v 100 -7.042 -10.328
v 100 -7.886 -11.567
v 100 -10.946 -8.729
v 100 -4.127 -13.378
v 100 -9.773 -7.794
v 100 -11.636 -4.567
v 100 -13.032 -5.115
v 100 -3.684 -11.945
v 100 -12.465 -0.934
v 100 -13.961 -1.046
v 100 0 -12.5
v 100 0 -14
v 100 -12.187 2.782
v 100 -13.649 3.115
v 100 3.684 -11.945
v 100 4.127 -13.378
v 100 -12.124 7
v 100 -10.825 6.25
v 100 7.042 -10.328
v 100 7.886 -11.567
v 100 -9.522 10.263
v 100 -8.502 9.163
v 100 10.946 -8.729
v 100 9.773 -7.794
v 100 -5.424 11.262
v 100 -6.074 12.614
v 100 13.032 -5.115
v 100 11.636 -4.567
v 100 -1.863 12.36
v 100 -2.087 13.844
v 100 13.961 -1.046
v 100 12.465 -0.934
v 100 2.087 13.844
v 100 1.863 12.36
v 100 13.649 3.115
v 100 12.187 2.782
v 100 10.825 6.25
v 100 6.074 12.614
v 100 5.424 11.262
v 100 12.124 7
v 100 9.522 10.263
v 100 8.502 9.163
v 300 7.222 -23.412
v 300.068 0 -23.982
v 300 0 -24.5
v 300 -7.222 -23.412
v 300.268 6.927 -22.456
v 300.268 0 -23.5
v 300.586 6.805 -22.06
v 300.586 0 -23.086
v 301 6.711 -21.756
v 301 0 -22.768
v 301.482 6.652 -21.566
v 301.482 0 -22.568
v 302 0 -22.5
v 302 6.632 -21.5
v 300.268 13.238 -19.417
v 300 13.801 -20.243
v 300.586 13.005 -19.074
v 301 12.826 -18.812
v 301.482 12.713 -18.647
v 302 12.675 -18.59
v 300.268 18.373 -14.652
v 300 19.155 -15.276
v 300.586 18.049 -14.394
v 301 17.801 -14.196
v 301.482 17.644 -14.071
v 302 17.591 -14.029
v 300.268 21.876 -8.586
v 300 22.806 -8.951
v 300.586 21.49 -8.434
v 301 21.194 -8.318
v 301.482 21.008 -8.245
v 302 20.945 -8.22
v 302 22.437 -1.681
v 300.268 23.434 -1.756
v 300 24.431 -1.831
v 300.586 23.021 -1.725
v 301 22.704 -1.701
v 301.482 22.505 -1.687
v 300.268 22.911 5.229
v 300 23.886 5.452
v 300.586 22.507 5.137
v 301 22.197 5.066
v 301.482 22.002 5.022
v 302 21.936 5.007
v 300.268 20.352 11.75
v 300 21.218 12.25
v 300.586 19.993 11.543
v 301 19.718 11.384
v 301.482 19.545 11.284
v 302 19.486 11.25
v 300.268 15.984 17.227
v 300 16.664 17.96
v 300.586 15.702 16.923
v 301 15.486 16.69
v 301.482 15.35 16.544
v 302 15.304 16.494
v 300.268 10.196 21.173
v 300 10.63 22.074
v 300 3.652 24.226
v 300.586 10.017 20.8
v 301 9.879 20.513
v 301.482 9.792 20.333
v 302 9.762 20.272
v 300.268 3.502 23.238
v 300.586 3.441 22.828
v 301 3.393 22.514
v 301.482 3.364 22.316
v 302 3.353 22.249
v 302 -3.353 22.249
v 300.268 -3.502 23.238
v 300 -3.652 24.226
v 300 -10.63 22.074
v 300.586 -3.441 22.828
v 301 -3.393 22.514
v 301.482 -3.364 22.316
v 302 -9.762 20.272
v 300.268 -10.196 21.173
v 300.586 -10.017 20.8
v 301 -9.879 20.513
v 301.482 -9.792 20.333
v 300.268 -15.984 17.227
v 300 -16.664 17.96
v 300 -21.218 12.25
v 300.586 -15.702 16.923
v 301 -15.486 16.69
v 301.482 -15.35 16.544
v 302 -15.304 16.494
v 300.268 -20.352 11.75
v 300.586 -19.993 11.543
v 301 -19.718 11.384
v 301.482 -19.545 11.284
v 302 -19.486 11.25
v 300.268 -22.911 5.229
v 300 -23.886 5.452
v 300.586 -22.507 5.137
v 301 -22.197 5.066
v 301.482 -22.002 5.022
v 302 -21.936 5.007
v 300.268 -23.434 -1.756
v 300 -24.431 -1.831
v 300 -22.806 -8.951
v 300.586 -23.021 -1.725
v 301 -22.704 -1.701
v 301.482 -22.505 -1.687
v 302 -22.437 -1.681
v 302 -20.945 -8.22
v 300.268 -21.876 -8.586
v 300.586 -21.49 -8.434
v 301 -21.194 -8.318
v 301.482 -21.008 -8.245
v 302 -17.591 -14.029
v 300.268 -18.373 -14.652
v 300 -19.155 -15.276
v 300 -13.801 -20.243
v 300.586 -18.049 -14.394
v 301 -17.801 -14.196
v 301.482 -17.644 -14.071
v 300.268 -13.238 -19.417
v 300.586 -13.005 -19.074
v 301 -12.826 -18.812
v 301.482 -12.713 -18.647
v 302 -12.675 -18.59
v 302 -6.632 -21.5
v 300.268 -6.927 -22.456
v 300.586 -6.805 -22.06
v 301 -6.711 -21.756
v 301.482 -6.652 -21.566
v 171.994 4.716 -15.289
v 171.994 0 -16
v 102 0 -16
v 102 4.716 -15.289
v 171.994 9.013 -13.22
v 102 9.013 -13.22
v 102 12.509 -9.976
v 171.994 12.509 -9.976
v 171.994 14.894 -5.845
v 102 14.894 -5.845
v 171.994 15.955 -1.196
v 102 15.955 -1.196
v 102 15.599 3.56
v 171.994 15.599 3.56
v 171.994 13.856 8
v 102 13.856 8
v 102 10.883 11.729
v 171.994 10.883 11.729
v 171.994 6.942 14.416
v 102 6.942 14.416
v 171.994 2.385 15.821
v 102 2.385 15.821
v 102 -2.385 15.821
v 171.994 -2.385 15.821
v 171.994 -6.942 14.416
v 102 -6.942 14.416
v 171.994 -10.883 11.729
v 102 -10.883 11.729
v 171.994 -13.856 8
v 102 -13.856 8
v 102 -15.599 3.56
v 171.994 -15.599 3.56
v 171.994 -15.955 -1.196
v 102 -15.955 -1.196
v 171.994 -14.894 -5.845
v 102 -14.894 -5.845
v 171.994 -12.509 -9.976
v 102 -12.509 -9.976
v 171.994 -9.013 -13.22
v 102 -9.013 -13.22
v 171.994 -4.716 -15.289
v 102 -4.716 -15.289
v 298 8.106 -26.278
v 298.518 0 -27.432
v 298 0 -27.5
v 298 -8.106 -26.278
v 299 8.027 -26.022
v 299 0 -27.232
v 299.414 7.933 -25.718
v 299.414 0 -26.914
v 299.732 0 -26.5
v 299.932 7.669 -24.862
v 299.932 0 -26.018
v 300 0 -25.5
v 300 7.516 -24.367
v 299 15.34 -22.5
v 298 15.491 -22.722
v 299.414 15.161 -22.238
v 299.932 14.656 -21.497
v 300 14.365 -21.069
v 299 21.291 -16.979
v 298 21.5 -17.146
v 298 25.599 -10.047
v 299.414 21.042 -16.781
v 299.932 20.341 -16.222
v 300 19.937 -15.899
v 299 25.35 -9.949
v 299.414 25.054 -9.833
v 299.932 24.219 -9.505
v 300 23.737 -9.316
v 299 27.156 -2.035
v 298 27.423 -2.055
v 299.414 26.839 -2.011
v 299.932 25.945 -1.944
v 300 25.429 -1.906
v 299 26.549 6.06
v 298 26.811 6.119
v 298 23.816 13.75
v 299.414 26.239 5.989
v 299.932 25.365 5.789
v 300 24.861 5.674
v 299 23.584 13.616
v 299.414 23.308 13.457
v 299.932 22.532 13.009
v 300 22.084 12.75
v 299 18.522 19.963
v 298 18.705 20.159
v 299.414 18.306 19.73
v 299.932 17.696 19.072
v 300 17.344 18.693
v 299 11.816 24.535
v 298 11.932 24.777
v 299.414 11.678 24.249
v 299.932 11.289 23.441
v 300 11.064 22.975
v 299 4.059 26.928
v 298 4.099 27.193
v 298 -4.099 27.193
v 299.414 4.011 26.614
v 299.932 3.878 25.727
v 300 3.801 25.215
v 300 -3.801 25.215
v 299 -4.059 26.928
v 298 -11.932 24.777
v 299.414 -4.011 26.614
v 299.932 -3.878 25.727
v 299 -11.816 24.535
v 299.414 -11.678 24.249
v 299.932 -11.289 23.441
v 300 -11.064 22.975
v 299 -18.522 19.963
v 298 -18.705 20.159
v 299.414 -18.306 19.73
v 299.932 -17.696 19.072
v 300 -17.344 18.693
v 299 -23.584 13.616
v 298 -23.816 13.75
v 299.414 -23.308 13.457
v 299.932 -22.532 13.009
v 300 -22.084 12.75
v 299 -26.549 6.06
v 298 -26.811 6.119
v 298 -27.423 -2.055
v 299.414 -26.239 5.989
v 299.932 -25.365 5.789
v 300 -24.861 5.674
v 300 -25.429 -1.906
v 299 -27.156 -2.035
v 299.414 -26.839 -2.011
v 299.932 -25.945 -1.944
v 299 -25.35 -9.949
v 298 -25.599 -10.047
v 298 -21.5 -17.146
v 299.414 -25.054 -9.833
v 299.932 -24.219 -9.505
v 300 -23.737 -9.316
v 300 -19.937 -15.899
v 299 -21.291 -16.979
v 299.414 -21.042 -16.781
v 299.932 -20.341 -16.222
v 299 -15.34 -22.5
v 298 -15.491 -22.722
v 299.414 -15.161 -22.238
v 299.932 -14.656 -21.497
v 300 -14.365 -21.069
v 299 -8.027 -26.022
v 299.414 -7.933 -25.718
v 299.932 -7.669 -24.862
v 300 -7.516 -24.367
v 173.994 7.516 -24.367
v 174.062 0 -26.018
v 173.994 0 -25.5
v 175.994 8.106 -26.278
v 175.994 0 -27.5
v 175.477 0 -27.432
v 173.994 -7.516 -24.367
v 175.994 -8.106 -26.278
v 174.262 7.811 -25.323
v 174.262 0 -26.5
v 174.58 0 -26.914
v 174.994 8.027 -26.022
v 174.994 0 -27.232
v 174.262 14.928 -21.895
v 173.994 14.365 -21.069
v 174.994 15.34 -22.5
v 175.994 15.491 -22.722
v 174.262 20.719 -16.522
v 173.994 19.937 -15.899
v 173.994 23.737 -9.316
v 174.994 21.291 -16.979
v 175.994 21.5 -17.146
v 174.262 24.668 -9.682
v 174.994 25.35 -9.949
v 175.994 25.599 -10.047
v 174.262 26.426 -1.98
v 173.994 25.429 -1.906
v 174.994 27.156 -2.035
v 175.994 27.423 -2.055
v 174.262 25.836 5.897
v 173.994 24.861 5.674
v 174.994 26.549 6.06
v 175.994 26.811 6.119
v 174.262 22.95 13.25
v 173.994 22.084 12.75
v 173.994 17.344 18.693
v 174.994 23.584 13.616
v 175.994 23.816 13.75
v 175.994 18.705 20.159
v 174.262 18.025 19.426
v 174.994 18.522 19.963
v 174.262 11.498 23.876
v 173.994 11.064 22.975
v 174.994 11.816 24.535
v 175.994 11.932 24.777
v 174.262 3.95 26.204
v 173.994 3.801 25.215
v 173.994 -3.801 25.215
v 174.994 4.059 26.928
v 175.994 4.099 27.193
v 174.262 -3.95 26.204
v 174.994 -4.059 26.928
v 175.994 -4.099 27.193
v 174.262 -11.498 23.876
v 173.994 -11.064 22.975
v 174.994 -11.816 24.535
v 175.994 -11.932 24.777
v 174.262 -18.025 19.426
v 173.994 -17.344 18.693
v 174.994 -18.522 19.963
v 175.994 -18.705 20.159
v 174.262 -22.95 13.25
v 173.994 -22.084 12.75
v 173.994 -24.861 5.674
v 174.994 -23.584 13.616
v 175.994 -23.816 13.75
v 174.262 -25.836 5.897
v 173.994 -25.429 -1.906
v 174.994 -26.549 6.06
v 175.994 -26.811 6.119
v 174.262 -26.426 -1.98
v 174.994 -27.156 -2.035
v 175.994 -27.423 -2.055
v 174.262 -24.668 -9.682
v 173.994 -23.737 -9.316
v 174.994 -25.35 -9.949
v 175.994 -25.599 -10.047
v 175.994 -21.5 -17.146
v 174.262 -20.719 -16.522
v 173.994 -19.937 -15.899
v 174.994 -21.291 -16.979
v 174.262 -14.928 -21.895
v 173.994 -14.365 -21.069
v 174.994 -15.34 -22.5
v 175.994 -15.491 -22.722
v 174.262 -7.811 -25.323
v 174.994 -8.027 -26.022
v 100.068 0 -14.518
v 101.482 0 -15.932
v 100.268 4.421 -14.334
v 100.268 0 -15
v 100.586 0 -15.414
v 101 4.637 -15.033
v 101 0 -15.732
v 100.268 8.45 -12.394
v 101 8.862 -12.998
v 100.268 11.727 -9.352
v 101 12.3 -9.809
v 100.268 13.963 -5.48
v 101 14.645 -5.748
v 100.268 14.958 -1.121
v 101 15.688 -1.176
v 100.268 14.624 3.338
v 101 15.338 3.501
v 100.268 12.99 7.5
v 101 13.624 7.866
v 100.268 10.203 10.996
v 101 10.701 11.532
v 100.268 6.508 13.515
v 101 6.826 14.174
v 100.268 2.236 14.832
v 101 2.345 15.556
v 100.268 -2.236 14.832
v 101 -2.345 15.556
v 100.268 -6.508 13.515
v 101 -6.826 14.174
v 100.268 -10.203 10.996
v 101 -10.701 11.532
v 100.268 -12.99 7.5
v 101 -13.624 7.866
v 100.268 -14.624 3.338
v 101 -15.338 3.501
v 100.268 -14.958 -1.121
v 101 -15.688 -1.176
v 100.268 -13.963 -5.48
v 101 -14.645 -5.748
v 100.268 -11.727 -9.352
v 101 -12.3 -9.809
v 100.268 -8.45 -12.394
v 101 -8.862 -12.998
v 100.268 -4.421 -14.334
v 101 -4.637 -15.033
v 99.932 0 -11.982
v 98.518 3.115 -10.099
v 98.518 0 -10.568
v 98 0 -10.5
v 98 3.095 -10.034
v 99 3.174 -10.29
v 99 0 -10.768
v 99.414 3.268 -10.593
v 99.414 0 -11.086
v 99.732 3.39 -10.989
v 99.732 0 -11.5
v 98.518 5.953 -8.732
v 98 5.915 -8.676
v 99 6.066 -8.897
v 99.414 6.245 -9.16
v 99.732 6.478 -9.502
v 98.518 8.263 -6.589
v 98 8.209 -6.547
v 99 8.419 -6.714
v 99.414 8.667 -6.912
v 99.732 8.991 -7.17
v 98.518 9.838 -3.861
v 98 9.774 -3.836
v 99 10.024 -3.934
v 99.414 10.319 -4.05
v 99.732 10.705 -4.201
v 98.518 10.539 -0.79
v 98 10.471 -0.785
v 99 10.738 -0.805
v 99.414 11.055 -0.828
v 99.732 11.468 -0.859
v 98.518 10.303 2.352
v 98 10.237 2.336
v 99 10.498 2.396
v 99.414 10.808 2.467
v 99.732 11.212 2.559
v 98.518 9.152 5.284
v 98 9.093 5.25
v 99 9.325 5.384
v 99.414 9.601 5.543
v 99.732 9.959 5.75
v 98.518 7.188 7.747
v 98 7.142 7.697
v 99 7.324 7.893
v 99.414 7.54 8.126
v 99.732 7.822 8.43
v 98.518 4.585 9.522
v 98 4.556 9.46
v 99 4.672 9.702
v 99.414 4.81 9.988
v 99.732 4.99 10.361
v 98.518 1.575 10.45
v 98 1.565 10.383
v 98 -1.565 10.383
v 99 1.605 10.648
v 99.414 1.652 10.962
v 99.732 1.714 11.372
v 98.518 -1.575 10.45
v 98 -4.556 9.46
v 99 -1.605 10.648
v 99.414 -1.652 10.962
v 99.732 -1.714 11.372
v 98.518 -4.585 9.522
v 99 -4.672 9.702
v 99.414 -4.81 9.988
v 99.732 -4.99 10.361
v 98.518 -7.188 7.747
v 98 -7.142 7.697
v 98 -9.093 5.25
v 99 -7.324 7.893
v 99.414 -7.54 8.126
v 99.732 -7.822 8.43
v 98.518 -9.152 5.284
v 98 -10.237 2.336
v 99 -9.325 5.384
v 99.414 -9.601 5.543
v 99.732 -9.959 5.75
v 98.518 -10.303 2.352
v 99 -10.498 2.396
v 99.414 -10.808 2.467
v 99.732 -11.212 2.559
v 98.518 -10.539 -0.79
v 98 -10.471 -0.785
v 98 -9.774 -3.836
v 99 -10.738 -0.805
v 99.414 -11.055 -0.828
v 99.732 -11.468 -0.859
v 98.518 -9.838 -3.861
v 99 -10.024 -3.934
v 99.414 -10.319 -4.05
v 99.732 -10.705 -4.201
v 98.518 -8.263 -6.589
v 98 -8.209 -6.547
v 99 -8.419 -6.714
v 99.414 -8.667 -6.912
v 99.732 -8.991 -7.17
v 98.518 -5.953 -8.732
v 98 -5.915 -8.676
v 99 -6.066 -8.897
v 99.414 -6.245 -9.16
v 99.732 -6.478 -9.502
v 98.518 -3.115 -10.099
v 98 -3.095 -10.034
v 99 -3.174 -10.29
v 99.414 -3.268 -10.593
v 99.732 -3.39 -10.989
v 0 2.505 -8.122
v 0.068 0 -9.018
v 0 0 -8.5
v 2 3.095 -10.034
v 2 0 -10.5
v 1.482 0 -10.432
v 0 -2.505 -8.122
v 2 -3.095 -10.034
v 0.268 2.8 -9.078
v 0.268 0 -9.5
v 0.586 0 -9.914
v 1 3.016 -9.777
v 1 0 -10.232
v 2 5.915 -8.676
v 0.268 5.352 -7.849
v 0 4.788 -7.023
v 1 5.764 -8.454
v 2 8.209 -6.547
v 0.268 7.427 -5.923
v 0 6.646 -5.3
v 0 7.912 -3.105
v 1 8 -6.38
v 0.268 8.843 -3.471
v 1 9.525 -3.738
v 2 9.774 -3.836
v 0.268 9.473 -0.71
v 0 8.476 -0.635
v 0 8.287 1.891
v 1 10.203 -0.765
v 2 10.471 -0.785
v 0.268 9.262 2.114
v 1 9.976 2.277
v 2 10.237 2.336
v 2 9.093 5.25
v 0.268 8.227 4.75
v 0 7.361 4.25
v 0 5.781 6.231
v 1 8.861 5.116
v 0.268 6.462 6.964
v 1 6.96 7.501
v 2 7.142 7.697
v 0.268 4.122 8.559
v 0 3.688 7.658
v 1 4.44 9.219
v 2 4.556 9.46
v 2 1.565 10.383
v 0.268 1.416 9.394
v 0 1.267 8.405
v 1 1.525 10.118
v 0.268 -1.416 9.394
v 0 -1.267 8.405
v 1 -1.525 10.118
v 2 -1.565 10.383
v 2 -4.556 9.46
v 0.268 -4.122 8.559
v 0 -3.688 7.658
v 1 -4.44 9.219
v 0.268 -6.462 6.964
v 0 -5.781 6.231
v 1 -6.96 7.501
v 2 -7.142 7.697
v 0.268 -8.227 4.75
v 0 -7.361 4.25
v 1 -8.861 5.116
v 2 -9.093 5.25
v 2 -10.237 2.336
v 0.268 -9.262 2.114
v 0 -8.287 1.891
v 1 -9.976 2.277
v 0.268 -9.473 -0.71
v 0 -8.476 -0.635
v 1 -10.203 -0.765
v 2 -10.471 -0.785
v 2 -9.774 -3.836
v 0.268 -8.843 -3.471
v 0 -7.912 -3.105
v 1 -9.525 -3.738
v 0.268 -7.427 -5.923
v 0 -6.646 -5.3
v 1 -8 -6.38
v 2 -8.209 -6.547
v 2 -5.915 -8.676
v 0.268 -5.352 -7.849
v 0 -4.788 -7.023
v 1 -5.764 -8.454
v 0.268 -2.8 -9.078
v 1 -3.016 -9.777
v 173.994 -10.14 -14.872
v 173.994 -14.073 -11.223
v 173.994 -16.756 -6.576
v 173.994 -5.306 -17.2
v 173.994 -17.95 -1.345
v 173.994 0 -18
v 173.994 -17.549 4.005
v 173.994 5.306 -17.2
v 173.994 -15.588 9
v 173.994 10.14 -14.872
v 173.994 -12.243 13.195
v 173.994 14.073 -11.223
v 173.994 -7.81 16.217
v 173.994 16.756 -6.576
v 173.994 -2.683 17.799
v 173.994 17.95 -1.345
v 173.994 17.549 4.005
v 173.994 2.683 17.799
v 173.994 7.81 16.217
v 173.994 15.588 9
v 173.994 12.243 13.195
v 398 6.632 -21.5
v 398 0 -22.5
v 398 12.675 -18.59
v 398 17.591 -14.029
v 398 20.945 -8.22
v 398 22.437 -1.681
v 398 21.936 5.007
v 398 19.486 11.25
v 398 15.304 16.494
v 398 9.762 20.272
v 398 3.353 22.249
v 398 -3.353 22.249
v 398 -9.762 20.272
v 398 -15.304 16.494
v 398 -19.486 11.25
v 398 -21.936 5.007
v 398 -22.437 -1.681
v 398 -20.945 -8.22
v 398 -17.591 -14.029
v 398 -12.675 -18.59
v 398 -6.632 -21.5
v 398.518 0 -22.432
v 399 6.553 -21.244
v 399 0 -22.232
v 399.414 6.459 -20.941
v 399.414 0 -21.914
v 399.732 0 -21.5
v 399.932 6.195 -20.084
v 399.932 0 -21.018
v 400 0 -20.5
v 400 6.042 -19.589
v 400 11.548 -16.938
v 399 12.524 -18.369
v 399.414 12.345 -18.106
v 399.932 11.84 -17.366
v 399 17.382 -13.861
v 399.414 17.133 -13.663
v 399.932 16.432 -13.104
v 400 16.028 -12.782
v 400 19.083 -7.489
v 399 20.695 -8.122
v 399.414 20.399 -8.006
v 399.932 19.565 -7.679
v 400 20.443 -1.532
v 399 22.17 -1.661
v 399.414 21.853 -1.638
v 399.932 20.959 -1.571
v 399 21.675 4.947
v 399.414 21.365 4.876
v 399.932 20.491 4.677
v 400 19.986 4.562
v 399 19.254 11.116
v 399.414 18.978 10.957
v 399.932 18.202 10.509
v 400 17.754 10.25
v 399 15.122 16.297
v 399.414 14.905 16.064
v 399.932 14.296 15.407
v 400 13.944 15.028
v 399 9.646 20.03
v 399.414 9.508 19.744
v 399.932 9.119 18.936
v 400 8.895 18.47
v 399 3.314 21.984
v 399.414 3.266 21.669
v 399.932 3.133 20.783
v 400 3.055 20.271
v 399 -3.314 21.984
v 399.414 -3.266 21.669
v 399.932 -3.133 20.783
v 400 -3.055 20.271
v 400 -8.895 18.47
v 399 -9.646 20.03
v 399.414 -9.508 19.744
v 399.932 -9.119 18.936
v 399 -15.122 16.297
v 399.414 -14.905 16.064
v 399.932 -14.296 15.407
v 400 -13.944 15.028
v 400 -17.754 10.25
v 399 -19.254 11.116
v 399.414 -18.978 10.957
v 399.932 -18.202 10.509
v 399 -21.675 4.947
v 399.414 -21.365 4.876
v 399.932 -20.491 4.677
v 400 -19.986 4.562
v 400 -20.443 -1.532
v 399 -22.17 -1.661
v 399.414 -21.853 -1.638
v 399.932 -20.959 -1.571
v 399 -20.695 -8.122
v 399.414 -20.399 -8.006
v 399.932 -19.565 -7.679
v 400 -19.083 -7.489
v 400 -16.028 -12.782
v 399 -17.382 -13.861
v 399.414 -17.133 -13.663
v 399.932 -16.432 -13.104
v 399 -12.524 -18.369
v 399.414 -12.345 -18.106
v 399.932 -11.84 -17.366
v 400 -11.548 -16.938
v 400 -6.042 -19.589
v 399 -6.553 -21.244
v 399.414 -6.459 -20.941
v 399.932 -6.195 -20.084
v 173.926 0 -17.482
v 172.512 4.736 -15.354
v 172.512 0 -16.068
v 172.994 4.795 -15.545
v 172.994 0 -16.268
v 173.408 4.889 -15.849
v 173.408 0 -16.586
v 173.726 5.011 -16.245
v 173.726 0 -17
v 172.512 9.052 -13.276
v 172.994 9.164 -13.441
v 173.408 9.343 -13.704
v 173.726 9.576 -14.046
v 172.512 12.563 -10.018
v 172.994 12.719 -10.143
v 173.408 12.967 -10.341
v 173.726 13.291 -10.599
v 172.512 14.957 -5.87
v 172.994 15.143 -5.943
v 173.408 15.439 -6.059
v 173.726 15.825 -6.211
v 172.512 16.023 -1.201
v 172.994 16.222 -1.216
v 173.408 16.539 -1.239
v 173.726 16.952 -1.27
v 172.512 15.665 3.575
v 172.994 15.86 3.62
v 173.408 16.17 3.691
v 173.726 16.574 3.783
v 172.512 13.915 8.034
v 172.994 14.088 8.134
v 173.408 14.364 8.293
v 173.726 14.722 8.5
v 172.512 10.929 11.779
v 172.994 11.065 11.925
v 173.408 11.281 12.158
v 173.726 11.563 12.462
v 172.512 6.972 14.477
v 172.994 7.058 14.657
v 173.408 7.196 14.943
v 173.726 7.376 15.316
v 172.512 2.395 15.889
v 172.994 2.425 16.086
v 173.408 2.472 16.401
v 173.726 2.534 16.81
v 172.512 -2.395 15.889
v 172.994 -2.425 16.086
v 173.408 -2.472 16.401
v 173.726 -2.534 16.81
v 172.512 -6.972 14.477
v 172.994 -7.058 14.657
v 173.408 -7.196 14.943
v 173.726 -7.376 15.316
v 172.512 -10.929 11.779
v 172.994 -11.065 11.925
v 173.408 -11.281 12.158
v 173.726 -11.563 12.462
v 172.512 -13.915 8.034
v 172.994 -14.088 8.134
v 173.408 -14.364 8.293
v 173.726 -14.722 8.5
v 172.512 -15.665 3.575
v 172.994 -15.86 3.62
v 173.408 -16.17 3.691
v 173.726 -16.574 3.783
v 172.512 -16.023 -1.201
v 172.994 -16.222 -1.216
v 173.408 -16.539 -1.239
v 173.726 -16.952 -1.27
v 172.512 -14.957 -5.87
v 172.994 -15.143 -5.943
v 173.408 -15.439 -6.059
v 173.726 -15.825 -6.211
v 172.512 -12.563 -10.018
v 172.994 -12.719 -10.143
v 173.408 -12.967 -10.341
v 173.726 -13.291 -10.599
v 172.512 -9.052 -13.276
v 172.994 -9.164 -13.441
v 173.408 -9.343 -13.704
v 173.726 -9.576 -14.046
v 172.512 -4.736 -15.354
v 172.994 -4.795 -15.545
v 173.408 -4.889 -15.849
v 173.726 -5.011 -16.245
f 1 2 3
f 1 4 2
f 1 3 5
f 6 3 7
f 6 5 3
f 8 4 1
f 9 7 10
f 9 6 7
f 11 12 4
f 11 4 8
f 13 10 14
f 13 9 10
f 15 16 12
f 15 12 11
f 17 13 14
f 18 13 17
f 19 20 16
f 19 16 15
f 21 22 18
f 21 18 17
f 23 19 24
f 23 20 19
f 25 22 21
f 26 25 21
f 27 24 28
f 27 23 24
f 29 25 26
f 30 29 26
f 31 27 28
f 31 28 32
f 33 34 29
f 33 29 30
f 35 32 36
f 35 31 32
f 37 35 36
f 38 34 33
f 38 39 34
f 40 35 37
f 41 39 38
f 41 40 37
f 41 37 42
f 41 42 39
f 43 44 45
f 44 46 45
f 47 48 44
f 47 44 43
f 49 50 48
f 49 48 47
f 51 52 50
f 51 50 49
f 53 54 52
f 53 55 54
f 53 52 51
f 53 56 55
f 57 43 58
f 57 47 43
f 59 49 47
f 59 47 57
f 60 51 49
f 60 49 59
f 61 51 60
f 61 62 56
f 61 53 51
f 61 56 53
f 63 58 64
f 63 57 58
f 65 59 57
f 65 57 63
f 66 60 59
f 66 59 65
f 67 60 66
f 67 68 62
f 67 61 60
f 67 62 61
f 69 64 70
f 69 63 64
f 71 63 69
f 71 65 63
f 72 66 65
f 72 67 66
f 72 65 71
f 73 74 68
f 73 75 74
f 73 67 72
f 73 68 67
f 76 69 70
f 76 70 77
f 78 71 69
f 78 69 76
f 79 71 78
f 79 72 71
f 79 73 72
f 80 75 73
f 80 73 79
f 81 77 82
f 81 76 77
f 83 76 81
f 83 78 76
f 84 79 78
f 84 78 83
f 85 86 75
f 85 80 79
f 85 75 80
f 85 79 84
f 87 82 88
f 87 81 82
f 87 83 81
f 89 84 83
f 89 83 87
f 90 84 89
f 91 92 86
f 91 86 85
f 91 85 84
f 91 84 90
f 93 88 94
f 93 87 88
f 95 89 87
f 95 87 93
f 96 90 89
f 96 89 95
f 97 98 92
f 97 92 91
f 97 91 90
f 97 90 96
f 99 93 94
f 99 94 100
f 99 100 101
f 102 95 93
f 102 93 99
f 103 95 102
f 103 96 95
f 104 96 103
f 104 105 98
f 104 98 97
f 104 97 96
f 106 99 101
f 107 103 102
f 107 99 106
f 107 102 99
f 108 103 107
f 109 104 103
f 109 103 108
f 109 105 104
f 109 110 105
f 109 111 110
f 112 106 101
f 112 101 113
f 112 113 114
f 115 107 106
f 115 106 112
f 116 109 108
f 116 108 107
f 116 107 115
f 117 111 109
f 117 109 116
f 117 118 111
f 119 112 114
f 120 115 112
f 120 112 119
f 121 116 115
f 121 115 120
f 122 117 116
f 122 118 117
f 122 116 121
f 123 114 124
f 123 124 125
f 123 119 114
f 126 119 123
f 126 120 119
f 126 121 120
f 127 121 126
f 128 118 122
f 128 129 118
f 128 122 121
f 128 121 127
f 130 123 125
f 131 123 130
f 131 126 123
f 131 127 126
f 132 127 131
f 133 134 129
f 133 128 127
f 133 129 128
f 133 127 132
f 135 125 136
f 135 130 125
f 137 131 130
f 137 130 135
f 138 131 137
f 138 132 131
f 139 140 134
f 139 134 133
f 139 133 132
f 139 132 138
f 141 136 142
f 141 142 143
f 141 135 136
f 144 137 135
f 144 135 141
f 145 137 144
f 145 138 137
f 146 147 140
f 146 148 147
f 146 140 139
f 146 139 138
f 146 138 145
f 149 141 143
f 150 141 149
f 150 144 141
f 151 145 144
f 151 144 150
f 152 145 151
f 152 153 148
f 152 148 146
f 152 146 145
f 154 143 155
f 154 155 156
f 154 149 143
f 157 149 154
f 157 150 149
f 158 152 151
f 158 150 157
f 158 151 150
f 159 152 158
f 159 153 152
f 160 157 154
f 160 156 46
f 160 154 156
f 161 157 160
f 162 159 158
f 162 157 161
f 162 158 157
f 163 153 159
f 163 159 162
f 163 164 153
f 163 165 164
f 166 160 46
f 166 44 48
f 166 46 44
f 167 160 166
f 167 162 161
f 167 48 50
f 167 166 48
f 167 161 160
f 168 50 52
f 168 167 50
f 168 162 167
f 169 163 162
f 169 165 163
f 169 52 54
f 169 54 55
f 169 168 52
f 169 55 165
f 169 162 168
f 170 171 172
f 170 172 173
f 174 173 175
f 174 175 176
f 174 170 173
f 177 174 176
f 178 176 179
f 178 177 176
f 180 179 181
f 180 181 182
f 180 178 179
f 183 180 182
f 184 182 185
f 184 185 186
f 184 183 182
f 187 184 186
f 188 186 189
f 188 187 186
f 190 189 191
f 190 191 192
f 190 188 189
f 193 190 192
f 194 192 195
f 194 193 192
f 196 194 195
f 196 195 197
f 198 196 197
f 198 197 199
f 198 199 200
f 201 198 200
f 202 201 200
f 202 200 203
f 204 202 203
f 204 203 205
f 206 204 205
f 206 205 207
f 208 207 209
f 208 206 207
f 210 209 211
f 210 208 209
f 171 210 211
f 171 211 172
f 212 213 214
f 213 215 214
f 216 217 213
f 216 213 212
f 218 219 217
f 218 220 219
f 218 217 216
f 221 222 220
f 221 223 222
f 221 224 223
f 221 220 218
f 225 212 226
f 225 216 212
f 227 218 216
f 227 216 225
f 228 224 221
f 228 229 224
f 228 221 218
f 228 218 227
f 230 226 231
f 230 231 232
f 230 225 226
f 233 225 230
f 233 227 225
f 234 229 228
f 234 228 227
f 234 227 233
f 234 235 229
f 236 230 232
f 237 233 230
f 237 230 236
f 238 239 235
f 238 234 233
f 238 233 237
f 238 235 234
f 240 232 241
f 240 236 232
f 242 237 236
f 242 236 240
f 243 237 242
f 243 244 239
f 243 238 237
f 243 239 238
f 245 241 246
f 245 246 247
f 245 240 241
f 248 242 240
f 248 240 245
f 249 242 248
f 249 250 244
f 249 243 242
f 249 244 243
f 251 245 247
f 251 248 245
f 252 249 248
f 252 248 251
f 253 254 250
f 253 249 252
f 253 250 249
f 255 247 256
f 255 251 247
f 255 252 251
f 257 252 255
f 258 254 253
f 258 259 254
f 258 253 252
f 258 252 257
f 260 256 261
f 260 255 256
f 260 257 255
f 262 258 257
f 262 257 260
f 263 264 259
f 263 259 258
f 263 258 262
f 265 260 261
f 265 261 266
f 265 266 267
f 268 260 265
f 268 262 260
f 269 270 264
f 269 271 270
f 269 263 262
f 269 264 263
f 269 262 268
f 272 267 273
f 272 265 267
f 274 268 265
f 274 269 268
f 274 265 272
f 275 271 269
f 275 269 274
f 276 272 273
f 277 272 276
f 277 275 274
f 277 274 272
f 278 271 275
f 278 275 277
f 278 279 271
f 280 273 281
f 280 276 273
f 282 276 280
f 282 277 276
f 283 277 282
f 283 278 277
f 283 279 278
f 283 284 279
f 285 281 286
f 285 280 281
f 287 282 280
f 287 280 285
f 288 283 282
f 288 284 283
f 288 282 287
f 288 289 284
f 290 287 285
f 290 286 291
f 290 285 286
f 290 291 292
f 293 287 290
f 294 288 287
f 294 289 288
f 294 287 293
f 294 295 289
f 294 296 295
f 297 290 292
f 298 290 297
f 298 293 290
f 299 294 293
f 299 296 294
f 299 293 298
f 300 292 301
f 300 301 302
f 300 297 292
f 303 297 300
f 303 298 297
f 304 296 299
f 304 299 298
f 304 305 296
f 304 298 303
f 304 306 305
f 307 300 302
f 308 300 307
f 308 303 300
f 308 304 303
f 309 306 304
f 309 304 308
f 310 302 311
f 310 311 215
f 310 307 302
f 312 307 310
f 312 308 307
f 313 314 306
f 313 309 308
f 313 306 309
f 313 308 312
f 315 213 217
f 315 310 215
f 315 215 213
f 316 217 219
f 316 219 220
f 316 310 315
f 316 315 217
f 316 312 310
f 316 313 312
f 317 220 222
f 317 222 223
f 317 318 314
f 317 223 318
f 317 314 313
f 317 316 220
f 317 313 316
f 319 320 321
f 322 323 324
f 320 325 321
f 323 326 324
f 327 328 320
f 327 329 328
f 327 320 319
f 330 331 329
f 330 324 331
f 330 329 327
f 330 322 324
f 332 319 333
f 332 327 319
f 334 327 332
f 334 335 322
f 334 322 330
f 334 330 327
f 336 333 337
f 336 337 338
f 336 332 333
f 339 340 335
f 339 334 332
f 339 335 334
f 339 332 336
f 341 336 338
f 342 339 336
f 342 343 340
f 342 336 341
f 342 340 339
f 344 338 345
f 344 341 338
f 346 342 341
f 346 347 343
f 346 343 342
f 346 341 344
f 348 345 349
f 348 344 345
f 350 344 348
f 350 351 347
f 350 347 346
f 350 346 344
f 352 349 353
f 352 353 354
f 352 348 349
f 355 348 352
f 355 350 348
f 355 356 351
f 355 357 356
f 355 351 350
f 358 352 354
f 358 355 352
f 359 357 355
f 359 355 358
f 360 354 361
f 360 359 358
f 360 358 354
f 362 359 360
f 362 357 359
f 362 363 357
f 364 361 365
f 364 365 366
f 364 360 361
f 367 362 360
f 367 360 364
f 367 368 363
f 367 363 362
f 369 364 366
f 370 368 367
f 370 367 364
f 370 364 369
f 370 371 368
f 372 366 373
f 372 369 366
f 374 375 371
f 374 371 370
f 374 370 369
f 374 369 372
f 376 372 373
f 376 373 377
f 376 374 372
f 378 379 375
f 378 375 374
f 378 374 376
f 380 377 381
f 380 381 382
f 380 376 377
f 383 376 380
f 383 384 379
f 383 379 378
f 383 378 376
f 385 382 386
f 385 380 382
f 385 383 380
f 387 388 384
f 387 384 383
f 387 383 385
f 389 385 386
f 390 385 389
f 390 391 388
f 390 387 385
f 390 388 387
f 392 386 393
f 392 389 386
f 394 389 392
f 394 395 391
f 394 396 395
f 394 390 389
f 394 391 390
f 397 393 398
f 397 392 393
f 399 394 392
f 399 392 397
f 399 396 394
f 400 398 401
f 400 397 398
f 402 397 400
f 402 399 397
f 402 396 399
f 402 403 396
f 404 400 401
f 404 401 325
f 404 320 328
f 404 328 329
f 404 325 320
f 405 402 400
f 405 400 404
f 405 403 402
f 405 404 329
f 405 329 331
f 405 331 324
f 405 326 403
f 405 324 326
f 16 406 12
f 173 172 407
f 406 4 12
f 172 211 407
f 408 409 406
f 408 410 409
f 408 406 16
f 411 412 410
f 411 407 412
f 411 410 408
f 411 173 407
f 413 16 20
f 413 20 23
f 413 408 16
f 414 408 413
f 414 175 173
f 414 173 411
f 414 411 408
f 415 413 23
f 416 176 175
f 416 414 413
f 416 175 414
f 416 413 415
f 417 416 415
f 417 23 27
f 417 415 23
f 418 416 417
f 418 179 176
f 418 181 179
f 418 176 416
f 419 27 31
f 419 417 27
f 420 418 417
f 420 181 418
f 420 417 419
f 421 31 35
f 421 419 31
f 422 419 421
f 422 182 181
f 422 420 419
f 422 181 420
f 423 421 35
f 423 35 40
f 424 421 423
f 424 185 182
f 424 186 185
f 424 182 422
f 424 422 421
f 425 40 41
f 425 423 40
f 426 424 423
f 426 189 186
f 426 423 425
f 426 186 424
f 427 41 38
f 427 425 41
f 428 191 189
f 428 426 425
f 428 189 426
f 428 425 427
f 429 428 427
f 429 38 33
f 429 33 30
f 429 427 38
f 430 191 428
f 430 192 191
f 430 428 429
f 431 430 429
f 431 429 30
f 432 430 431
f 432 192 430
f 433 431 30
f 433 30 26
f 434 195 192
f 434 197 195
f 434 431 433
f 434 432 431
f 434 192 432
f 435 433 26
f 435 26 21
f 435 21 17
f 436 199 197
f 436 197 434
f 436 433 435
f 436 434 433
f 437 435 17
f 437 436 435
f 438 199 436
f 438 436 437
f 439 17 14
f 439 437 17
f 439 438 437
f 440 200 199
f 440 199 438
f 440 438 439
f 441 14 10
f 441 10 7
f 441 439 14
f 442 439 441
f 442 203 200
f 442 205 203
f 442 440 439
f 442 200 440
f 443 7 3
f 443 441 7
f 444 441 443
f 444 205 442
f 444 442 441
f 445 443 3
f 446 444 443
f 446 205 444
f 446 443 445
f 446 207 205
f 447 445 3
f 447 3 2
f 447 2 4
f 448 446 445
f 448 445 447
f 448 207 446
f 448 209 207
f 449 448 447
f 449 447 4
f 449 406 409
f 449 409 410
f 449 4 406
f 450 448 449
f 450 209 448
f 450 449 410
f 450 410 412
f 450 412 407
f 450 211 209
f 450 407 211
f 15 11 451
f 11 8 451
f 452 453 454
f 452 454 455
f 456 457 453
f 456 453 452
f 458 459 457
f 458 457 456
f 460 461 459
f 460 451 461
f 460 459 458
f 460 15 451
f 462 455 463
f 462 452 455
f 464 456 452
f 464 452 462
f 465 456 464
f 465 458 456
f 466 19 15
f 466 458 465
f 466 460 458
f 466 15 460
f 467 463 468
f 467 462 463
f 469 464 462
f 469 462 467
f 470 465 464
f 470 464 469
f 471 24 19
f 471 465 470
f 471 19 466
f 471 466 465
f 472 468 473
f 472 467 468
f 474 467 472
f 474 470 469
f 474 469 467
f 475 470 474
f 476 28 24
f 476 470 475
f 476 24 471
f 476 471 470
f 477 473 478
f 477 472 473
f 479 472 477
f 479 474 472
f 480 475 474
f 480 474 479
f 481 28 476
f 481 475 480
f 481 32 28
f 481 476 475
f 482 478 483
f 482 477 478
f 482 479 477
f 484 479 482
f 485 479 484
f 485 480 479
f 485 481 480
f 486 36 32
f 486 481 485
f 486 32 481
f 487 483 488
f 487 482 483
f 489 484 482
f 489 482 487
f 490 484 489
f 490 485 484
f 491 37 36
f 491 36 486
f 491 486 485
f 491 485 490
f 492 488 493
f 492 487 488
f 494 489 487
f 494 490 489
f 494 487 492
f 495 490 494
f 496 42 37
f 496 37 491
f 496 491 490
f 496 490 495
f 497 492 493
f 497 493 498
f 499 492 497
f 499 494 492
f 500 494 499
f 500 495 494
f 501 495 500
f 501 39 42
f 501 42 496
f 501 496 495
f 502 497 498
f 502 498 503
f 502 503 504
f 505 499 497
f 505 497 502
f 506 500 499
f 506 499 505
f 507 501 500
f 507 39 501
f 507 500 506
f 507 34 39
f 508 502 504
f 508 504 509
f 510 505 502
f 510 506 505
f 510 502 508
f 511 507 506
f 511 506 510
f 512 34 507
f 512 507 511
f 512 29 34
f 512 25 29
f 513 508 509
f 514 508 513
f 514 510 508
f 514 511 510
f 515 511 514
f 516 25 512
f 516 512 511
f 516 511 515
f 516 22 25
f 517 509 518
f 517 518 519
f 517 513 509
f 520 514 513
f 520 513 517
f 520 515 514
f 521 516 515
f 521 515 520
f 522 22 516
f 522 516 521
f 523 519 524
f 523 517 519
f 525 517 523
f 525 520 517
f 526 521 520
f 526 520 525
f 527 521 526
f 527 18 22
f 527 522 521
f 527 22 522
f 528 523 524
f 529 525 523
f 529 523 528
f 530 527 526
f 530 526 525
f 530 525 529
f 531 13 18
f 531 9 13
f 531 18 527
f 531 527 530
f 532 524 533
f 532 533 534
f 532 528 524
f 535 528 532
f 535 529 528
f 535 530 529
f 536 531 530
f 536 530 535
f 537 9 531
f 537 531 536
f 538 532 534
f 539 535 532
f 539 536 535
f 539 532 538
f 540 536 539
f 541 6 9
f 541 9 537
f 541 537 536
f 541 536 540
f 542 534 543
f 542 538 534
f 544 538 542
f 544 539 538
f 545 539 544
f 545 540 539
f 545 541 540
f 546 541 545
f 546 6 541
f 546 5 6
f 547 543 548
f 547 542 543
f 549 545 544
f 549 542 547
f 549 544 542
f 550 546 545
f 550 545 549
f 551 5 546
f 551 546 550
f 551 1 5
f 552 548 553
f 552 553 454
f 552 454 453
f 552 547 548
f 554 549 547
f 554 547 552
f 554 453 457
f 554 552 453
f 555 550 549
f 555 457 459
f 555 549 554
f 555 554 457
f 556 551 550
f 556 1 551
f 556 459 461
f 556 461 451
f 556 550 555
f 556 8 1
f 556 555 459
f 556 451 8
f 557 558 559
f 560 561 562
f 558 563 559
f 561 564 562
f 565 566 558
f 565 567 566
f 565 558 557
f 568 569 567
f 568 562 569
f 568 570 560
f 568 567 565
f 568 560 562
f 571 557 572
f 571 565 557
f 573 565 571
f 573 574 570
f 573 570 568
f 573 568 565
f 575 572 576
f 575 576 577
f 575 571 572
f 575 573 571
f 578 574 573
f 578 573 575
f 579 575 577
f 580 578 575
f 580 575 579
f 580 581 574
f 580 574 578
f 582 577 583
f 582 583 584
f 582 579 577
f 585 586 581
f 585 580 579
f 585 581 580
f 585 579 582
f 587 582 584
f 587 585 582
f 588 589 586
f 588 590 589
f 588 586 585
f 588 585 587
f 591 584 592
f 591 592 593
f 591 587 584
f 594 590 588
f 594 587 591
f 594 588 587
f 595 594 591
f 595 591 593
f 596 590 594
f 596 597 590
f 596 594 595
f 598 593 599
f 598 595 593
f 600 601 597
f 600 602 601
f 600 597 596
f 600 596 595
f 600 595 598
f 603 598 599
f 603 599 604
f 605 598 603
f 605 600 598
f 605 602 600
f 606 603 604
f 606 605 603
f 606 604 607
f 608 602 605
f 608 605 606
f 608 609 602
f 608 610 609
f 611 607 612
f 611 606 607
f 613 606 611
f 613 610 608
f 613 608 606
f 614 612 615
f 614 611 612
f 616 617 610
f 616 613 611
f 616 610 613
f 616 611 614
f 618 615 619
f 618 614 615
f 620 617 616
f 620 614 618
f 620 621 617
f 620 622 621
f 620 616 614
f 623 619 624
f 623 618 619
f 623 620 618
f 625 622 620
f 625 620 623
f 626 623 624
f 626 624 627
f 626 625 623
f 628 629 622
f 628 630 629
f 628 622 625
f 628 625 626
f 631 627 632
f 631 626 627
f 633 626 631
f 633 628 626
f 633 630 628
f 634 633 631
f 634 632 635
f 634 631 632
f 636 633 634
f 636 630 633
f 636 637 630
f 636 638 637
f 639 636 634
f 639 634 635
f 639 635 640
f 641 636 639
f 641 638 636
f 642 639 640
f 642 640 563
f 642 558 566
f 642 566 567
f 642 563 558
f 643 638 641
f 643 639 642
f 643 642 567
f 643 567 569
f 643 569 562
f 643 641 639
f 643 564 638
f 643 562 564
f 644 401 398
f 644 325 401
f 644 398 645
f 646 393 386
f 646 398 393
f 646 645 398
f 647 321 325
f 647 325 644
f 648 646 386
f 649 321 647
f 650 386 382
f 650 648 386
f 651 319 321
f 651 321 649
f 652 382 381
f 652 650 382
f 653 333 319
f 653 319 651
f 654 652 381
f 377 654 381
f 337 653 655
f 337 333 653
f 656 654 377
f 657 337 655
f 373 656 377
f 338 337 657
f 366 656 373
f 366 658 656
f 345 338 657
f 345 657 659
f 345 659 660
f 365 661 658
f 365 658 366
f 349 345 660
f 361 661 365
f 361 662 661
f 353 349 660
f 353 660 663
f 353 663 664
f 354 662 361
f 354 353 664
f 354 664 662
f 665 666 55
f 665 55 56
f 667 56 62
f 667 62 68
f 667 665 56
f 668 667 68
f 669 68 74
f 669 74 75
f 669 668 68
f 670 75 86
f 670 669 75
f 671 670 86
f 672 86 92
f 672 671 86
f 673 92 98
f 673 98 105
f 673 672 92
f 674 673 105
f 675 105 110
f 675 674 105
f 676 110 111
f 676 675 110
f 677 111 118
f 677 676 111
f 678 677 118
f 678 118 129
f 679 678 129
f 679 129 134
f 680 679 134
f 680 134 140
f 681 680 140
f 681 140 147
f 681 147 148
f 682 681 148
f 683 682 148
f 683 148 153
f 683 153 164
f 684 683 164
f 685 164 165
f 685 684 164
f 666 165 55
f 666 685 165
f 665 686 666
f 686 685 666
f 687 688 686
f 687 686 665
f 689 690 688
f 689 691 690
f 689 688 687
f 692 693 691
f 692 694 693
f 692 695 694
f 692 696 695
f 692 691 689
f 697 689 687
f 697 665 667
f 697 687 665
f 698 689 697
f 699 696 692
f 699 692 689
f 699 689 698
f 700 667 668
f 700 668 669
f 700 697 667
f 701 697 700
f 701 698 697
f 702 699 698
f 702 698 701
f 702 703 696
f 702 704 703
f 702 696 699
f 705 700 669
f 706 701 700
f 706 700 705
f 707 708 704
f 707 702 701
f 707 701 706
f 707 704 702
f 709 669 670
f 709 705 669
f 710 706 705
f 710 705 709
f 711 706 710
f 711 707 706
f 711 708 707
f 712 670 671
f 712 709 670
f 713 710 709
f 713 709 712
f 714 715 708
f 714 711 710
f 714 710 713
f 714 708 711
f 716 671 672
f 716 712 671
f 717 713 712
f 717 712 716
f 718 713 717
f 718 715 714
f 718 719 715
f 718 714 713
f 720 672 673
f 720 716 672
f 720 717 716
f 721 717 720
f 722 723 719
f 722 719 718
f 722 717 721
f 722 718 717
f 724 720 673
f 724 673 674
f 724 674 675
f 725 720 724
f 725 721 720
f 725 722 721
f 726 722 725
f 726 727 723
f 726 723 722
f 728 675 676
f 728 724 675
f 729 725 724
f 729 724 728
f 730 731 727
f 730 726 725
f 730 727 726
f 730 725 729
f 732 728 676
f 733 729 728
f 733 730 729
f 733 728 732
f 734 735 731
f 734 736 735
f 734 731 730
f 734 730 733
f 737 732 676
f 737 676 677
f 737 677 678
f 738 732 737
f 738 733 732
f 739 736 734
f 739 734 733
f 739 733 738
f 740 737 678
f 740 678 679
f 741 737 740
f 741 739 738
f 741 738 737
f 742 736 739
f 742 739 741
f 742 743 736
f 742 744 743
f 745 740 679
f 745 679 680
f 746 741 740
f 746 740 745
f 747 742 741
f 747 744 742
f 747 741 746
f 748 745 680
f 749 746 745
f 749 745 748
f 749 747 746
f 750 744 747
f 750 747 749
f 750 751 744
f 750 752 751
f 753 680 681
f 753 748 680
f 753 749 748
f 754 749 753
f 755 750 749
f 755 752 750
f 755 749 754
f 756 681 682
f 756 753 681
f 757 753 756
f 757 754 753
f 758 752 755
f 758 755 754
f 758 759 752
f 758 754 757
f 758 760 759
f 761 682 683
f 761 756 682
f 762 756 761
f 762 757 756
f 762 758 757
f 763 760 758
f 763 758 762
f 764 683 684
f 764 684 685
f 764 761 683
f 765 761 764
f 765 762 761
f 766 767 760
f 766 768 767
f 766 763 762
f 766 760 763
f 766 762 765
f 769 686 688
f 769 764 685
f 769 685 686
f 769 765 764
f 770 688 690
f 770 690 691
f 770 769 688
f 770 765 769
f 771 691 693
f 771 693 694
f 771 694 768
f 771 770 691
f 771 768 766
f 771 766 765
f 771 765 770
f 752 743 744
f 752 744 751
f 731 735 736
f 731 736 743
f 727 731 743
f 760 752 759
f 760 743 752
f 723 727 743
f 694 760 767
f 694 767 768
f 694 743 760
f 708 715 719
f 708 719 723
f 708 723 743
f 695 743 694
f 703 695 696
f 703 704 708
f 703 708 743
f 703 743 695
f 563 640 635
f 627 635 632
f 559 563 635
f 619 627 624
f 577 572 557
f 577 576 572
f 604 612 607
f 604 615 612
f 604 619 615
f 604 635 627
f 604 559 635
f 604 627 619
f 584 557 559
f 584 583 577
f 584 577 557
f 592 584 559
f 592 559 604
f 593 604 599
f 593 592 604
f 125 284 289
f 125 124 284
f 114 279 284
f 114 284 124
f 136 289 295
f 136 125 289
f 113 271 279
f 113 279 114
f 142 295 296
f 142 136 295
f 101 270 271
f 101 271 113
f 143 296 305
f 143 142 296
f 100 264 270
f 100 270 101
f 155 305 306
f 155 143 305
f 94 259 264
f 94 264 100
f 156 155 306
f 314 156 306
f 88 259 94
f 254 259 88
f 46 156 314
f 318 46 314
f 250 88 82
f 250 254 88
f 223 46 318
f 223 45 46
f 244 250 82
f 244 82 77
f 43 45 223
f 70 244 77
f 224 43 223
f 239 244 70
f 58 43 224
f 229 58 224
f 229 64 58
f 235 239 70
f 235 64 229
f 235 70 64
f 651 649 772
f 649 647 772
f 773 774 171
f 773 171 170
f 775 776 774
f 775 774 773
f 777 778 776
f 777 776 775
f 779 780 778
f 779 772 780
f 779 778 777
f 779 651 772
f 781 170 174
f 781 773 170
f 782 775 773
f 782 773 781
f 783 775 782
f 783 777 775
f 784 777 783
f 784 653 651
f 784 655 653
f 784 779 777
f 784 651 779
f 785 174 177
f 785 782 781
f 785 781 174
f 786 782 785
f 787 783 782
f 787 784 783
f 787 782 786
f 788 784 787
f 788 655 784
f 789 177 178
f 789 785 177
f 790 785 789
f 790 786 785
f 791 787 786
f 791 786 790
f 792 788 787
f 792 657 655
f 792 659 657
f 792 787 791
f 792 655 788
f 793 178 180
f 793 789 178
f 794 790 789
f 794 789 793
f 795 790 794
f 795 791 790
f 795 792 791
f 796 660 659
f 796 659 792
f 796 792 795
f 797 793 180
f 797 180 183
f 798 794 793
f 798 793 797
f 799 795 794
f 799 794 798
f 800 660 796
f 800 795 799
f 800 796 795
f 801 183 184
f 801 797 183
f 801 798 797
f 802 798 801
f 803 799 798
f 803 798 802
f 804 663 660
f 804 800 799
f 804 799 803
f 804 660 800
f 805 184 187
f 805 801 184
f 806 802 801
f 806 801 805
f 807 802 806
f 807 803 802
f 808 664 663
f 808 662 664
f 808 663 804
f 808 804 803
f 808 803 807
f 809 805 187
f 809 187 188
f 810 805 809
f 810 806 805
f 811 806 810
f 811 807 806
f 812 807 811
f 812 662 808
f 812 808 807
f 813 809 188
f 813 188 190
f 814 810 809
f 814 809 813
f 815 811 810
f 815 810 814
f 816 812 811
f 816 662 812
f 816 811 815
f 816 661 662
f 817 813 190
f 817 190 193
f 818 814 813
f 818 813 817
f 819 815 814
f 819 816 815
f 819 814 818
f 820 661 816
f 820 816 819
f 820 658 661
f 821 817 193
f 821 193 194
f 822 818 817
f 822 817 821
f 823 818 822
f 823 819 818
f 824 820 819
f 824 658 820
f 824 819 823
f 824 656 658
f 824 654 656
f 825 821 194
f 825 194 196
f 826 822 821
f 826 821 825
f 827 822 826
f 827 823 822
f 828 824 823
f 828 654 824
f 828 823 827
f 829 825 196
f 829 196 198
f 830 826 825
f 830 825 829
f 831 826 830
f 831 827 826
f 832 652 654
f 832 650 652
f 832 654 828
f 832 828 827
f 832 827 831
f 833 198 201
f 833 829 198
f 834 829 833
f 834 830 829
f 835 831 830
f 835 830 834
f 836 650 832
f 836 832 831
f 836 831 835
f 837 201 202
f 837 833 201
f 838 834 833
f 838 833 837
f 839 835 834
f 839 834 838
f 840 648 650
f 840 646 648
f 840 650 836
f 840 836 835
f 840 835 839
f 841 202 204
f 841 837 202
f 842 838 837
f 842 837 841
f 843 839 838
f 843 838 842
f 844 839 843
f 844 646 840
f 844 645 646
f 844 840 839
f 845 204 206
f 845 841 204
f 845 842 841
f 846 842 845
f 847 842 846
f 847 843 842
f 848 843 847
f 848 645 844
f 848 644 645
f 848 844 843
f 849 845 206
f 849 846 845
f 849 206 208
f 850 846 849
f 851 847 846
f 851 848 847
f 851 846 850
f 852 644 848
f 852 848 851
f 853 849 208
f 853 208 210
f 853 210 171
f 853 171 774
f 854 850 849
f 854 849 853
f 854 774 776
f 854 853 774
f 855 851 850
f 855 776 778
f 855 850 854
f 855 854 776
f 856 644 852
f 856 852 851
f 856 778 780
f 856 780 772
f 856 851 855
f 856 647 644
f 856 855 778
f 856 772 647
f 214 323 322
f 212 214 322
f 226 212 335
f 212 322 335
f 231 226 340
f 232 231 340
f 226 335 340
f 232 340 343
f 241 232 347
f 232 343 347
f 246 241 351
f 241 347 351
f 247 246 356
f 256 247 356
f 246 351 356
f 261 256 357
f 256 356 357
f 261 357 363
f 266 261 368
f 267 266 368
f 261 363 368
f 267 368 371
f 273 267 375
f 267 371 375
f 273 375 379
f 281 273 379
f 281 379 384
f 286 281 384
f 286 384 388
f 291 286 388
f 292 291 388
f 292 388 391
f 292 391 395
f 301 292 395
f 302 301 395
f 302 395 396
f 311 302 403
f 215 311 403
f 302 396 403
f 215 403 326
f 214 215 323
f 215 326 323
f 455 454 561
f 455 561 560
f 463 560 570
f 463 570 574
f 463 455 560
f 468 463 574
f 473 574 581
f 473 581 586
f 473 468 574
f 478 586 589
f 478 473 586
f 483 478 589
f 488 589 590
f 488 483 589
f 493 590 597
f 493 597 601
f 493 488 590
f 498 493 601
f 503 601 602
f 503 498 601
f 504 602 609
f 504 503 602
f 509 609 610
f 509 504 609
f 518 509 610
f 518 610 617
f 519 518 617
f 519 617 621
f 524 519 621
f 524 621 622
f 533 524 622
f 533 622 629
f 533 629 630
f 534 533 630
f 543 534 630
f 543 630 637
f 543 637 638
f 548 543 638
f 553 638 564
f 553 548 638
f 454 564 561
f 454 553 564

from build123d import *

# Parameters (mm, degrees)
FILLET4_R = 2
FILLET5_R = 2


with BuildPart() as part:
    # Sketch1 → Revolve1 (revolve)
    with BuildSketch(Plane(origin=(0, 0, 0), x_dir=(1, 0, 0), z_dir=(0, 1, 0))):
        Polygon((0, 0), (0, 10.5), (100, 10.5), (100, 16), (173.994186745, 16), (173.994186745, 27.5), (200, 27.5), (300, 27.5), (300, 22.5), (400, 22.5), (400, 0), align=None)
    revolve(axis=Axis((0, 0, 0), (1, 0, 0)))

    # Fillet4
    fillet4_edges = [part.edges().sort_by_distance(p)[0] for p in [
        (0, 0, 10.5),
    ]]
    fillet(fillet4_edges, radius=FILLET4_R)

    # Fillet5
    fillet5_edges = [part.edges().sort_by_distance(p)[0] for p in [
        (100, 0, 16),
        (173.994186745, 0, 16),
        (173.994186745, 0, 27.5),
        (300, 0, 27.5),
        (300, 0, 22.5),
        (400, 0, 22.5),
        (100, 0, 10.5),
    ]]
    fillet(fillet5_edges, radius=FILLET5_R)


solid = part.part
